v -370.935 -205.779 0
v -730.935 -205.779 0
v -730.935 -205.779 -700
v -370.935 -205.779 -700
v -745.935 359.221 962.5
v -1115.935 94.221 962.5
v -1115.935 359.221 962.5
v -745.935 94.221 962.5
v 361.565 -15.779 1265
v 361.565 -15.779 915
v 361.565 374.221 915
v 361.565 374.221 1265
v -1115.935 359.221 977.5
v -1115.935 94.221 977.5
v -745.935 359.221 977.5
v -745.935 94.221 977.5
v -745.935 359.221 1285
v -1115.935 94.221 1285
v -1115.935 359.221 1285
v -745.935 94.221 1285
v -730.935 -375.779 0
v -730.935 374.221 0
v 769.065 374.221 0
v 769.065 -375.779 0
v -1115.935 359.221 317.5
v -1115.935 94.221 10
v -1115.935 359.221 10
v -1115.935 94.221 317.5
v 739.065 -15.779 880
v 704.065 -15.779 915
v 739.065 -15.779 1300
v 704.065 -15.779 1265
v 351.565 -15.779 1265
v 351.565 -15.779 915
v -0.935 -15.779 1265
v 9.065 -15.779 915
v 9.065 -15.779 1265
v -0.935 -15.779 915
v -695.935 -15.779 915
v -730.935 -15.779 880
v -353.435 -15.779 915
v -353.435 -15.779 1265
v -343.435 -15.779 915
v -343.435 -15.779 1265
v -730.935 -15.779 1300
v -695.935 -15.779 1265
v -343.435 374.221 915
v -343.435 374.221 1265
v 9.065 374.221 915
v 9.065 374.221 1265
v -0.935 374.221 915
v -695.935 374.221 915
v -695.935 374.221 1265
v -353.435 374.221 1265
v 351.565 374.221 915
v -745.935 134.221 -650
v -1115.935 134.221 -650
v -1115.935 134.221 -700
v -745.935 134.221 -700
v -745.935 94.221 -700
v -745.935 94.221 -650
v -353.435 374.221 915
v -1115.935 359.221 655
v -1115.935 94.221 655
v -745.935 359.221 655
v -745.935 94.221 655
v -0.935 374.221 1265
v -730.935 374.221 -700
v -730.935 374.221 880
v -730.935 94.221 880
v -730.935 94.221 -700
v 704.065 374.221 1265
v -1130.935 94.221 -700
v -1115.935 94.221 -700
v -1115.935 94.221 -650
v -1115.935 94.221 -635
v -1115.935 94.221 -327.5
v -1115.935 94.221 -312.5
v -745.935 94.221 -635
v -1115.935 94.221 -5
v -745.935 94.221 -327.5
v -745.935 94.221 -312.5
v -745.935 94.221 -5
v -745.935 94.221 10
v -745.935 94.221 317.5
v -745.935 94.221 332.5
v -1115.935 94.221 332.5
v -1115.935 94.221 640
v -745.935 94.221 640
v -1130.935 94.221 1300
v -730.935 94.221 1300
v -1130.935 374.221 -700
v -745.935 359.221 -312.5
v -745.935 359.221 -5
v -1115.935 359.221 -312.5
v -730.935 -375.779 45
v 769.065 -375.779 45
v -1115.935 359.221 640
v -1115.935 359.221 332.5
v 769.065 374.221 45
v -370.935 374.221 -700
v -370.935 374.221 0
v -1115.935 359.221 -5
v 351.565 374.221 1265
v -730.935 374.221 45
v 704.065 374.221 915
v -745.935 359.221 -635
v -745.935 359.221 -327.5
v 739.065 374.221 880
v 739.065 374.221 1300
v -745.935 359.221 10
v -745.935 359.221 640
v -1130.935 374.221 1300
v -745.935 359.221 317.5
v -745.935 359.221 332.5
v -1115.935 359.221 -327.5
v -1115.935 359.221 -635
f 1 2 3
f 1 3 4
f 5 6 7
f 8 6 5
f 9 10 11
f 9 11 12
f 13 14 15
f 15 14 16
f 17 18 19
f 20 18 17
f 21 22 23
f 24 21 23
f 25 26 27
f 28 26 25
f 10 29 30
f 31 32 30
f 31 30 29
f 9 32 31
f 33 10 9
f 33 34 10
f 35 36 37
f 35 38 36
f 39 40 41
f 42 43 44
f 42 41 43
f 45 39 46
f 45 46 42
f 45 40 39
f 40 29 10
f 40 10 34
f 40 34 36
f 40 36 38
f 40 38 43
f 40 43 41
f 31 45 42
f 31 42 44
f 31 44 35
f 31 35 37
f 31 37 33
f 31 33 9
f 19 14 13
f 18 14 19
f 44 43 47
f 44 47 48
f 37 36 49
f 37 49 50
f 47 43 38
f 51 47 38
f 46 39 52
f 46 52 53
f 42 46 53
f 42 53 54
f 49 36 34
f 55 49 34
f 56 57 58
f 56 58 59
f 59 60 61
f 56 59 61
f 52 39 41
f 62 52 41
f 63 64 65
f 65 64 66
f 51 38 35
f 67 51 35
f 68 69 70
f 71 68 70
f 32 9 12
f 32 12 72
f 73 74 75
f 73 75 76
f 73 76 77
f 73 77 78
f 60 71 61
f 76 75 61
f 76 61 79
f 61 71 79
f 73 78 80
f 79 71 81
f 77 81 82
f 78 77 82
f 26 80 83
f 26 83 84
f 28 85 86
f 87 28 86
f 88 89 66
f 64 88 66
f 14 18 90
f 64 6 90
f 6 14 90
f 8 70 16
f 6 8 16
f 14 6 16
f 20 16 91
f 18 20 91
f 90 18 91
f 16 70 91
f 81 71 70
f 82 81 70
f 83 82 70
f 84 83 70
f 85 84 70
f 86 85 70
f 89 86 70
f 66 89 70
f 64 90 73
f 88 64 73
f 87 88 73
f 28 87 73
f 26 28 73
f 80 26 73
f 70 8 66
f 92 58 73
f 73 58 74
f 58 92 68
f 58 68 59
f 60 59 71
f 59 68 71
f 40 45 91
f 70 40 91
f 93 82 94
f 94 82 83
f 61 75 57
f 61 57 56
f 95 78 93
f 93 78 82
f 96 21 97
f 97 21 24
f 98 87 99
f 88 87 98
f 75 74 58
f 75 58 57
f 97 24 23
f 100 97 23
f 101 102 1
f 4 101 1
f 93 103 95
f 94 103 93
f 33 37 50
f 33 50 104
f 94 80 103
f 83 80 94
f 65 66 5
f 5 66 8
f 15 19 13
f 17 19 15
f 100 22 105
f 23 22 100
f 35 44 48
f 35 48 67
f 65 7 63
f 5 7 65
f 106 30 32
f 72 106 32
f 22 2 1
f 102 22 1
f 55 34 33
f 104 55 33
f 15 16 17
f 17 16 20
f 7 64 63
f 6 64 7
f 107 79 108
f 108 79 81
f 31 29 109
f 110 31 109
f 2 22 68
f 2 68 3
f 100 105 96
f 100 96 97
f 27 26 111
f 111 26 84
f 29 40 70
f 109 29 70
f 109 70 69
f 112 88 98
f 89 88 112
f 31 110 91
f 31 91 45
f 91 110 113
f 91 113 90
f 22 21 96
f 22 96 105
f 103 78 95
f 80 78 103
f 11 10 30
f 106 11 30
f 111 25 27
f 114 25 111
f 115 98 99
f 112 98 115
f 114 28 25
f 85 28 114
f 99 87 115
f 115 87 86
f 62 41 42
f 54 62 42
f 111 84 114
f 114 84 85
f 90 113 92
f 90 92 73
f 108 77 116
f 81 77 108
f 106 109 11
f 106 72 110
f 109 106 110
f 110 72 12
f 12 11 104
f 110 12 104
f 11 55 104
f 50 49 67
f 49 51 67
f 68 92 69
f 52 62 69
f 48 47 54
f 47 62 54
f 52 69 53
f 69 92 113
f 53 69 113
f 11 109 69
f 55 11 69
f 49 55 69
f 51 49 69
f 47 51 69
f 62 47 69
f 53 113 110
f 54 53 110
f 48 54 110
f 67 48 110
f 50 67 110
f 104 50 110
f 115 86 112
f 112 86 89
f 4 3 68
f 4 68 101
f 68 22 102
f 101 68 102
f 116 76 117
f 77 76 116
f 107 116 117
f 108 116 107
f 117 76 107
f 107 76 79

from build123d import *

# Parameters (mm, degrees)
F0_W      = 1500
F0_H      = 750
F1_DEPTH  = 45
F2_W      = 360
F2_H      = 580
F3_DEPTH  = 700
F8_W      = 280
F8_H      = 2000
F9_DEPTH  = 400
F10_W     = 370
F10_H     = 307.5
F11_DEPTH = 265
F10_H_2   = 50
F12_DEPTH = 40
F13_W     = 110
F13_H     = 420
F13_W_2   = 280
F14_DEPTH = 1470
F15_W     = 342.5
F15_H     = 350
F16_DEPTH = 390


# Not quite as in the source:
# - the program builds the solid bodies; features that only make, move or delete a surface that nothing else refers to are left out


with BuildPart() as f1:
    # F0 (on Top) → F1 (new body)
    with BuildSketch(Plane.XY):
        with Locations((19.0651228034, -0.7792990655)):
            Rectangle(F0_W, F0_H)
    extrude(amount=F1_DEPTH)


with BuildPart() as f3:
    # F2 (on face) → F3 (new body)
    with BuildSketch(Plane(origin=(0, 0, 0), x_dir=(1, 0, 0), z_dir=(0, 0, -1))):
        with Locations((-550.9348771966, -84.2207009345)):
            Rectangle(F2_W, F2_H)
    extrude(amount=F3_DEPTH)


with BuildPart() as f9:
    # F8 (on face) → F9 (new body)
    with BuildSketch(Plane(origin=(-730.9348771966, 0, 0), x_dir=(0, -1, 0), z_dir=(-1, 0, 0))):
        with Locations((-234.2207009345, 300)):
            Rectangle(F8_W, F8_H)
    extrude(amount=F9_DEPTH)

    # F10 (on face) → F11 (cut)
    with BuildSketch(Plane.XZ.offset(-94.2207009345)):
        with Locations((-930.9348771966, -481.25)):
            Rectangle(F10_W, F10_H)
        with Locations((-930.9348771966, -158.75)):
            Rectangle(F10_W, F10_H)
        with Locations((-930.9348771966, 163.75)):
            Rectangle(F10_W, F10_H)
        with Locations((-930.9348771966, 486.25)):
            Rectangle(F10_W, F10_H)
        with Locations((-930.9348771966, 808.75)):
            Rectangle(F10_W, F10_H)
        with Locations((-930.9348771966, 1131.25)):
            Rectangle(F10_W, F10_H)
    extrude(amount=-F11_DEPTH, mode=Mode.SUBTRACT)

    # F10 (on face) → F12 (cut)
    with BuildSketch(Plane.XZ.offset(-94.2207009345)):
        with Locations((-930.9348771966, -675)):
            Rectangle(F10_W, F10_H_2)
    extrude(amount=-F12_DEPTH, mode=Mode.SUBTRACT)

    # F13 (on face) → F14 (join)
    with BuildSketch(Plane.YZ.offset(-730.9348771966)):
        with Locations((39.2207009345, 1090)):
            Rectangle(F13_W, F13_H)
        with Locations((234.2207009345, 1090)):
            Rectangle(F13_W_2, F13_H)
    extrude(amount=F14_DEPTH)

    # F15 (on face) → F16 (cut)
    with BuildSketch(Plane.XZ.offset(15.7792990655)):
        with Locations((-524.6848771966, 1090)):
            Rectangle(F15_W, F15_H)
        with Locations((-172.1848771966, 1090)):
            Rectangle(F15_W, F15_H)
        with Locations((180.3151228034, 1090)):
            Rectangle(F15_W, F15_H)
        with Locations((532.8151228034, 1090)):
            Rectangle(F15_W, F15_H)
    extrude(amount=-F16_DEPTH, mode=Mode.SUBTRACT)


solid = Compound([f1.part, f3.part, f9.part])
